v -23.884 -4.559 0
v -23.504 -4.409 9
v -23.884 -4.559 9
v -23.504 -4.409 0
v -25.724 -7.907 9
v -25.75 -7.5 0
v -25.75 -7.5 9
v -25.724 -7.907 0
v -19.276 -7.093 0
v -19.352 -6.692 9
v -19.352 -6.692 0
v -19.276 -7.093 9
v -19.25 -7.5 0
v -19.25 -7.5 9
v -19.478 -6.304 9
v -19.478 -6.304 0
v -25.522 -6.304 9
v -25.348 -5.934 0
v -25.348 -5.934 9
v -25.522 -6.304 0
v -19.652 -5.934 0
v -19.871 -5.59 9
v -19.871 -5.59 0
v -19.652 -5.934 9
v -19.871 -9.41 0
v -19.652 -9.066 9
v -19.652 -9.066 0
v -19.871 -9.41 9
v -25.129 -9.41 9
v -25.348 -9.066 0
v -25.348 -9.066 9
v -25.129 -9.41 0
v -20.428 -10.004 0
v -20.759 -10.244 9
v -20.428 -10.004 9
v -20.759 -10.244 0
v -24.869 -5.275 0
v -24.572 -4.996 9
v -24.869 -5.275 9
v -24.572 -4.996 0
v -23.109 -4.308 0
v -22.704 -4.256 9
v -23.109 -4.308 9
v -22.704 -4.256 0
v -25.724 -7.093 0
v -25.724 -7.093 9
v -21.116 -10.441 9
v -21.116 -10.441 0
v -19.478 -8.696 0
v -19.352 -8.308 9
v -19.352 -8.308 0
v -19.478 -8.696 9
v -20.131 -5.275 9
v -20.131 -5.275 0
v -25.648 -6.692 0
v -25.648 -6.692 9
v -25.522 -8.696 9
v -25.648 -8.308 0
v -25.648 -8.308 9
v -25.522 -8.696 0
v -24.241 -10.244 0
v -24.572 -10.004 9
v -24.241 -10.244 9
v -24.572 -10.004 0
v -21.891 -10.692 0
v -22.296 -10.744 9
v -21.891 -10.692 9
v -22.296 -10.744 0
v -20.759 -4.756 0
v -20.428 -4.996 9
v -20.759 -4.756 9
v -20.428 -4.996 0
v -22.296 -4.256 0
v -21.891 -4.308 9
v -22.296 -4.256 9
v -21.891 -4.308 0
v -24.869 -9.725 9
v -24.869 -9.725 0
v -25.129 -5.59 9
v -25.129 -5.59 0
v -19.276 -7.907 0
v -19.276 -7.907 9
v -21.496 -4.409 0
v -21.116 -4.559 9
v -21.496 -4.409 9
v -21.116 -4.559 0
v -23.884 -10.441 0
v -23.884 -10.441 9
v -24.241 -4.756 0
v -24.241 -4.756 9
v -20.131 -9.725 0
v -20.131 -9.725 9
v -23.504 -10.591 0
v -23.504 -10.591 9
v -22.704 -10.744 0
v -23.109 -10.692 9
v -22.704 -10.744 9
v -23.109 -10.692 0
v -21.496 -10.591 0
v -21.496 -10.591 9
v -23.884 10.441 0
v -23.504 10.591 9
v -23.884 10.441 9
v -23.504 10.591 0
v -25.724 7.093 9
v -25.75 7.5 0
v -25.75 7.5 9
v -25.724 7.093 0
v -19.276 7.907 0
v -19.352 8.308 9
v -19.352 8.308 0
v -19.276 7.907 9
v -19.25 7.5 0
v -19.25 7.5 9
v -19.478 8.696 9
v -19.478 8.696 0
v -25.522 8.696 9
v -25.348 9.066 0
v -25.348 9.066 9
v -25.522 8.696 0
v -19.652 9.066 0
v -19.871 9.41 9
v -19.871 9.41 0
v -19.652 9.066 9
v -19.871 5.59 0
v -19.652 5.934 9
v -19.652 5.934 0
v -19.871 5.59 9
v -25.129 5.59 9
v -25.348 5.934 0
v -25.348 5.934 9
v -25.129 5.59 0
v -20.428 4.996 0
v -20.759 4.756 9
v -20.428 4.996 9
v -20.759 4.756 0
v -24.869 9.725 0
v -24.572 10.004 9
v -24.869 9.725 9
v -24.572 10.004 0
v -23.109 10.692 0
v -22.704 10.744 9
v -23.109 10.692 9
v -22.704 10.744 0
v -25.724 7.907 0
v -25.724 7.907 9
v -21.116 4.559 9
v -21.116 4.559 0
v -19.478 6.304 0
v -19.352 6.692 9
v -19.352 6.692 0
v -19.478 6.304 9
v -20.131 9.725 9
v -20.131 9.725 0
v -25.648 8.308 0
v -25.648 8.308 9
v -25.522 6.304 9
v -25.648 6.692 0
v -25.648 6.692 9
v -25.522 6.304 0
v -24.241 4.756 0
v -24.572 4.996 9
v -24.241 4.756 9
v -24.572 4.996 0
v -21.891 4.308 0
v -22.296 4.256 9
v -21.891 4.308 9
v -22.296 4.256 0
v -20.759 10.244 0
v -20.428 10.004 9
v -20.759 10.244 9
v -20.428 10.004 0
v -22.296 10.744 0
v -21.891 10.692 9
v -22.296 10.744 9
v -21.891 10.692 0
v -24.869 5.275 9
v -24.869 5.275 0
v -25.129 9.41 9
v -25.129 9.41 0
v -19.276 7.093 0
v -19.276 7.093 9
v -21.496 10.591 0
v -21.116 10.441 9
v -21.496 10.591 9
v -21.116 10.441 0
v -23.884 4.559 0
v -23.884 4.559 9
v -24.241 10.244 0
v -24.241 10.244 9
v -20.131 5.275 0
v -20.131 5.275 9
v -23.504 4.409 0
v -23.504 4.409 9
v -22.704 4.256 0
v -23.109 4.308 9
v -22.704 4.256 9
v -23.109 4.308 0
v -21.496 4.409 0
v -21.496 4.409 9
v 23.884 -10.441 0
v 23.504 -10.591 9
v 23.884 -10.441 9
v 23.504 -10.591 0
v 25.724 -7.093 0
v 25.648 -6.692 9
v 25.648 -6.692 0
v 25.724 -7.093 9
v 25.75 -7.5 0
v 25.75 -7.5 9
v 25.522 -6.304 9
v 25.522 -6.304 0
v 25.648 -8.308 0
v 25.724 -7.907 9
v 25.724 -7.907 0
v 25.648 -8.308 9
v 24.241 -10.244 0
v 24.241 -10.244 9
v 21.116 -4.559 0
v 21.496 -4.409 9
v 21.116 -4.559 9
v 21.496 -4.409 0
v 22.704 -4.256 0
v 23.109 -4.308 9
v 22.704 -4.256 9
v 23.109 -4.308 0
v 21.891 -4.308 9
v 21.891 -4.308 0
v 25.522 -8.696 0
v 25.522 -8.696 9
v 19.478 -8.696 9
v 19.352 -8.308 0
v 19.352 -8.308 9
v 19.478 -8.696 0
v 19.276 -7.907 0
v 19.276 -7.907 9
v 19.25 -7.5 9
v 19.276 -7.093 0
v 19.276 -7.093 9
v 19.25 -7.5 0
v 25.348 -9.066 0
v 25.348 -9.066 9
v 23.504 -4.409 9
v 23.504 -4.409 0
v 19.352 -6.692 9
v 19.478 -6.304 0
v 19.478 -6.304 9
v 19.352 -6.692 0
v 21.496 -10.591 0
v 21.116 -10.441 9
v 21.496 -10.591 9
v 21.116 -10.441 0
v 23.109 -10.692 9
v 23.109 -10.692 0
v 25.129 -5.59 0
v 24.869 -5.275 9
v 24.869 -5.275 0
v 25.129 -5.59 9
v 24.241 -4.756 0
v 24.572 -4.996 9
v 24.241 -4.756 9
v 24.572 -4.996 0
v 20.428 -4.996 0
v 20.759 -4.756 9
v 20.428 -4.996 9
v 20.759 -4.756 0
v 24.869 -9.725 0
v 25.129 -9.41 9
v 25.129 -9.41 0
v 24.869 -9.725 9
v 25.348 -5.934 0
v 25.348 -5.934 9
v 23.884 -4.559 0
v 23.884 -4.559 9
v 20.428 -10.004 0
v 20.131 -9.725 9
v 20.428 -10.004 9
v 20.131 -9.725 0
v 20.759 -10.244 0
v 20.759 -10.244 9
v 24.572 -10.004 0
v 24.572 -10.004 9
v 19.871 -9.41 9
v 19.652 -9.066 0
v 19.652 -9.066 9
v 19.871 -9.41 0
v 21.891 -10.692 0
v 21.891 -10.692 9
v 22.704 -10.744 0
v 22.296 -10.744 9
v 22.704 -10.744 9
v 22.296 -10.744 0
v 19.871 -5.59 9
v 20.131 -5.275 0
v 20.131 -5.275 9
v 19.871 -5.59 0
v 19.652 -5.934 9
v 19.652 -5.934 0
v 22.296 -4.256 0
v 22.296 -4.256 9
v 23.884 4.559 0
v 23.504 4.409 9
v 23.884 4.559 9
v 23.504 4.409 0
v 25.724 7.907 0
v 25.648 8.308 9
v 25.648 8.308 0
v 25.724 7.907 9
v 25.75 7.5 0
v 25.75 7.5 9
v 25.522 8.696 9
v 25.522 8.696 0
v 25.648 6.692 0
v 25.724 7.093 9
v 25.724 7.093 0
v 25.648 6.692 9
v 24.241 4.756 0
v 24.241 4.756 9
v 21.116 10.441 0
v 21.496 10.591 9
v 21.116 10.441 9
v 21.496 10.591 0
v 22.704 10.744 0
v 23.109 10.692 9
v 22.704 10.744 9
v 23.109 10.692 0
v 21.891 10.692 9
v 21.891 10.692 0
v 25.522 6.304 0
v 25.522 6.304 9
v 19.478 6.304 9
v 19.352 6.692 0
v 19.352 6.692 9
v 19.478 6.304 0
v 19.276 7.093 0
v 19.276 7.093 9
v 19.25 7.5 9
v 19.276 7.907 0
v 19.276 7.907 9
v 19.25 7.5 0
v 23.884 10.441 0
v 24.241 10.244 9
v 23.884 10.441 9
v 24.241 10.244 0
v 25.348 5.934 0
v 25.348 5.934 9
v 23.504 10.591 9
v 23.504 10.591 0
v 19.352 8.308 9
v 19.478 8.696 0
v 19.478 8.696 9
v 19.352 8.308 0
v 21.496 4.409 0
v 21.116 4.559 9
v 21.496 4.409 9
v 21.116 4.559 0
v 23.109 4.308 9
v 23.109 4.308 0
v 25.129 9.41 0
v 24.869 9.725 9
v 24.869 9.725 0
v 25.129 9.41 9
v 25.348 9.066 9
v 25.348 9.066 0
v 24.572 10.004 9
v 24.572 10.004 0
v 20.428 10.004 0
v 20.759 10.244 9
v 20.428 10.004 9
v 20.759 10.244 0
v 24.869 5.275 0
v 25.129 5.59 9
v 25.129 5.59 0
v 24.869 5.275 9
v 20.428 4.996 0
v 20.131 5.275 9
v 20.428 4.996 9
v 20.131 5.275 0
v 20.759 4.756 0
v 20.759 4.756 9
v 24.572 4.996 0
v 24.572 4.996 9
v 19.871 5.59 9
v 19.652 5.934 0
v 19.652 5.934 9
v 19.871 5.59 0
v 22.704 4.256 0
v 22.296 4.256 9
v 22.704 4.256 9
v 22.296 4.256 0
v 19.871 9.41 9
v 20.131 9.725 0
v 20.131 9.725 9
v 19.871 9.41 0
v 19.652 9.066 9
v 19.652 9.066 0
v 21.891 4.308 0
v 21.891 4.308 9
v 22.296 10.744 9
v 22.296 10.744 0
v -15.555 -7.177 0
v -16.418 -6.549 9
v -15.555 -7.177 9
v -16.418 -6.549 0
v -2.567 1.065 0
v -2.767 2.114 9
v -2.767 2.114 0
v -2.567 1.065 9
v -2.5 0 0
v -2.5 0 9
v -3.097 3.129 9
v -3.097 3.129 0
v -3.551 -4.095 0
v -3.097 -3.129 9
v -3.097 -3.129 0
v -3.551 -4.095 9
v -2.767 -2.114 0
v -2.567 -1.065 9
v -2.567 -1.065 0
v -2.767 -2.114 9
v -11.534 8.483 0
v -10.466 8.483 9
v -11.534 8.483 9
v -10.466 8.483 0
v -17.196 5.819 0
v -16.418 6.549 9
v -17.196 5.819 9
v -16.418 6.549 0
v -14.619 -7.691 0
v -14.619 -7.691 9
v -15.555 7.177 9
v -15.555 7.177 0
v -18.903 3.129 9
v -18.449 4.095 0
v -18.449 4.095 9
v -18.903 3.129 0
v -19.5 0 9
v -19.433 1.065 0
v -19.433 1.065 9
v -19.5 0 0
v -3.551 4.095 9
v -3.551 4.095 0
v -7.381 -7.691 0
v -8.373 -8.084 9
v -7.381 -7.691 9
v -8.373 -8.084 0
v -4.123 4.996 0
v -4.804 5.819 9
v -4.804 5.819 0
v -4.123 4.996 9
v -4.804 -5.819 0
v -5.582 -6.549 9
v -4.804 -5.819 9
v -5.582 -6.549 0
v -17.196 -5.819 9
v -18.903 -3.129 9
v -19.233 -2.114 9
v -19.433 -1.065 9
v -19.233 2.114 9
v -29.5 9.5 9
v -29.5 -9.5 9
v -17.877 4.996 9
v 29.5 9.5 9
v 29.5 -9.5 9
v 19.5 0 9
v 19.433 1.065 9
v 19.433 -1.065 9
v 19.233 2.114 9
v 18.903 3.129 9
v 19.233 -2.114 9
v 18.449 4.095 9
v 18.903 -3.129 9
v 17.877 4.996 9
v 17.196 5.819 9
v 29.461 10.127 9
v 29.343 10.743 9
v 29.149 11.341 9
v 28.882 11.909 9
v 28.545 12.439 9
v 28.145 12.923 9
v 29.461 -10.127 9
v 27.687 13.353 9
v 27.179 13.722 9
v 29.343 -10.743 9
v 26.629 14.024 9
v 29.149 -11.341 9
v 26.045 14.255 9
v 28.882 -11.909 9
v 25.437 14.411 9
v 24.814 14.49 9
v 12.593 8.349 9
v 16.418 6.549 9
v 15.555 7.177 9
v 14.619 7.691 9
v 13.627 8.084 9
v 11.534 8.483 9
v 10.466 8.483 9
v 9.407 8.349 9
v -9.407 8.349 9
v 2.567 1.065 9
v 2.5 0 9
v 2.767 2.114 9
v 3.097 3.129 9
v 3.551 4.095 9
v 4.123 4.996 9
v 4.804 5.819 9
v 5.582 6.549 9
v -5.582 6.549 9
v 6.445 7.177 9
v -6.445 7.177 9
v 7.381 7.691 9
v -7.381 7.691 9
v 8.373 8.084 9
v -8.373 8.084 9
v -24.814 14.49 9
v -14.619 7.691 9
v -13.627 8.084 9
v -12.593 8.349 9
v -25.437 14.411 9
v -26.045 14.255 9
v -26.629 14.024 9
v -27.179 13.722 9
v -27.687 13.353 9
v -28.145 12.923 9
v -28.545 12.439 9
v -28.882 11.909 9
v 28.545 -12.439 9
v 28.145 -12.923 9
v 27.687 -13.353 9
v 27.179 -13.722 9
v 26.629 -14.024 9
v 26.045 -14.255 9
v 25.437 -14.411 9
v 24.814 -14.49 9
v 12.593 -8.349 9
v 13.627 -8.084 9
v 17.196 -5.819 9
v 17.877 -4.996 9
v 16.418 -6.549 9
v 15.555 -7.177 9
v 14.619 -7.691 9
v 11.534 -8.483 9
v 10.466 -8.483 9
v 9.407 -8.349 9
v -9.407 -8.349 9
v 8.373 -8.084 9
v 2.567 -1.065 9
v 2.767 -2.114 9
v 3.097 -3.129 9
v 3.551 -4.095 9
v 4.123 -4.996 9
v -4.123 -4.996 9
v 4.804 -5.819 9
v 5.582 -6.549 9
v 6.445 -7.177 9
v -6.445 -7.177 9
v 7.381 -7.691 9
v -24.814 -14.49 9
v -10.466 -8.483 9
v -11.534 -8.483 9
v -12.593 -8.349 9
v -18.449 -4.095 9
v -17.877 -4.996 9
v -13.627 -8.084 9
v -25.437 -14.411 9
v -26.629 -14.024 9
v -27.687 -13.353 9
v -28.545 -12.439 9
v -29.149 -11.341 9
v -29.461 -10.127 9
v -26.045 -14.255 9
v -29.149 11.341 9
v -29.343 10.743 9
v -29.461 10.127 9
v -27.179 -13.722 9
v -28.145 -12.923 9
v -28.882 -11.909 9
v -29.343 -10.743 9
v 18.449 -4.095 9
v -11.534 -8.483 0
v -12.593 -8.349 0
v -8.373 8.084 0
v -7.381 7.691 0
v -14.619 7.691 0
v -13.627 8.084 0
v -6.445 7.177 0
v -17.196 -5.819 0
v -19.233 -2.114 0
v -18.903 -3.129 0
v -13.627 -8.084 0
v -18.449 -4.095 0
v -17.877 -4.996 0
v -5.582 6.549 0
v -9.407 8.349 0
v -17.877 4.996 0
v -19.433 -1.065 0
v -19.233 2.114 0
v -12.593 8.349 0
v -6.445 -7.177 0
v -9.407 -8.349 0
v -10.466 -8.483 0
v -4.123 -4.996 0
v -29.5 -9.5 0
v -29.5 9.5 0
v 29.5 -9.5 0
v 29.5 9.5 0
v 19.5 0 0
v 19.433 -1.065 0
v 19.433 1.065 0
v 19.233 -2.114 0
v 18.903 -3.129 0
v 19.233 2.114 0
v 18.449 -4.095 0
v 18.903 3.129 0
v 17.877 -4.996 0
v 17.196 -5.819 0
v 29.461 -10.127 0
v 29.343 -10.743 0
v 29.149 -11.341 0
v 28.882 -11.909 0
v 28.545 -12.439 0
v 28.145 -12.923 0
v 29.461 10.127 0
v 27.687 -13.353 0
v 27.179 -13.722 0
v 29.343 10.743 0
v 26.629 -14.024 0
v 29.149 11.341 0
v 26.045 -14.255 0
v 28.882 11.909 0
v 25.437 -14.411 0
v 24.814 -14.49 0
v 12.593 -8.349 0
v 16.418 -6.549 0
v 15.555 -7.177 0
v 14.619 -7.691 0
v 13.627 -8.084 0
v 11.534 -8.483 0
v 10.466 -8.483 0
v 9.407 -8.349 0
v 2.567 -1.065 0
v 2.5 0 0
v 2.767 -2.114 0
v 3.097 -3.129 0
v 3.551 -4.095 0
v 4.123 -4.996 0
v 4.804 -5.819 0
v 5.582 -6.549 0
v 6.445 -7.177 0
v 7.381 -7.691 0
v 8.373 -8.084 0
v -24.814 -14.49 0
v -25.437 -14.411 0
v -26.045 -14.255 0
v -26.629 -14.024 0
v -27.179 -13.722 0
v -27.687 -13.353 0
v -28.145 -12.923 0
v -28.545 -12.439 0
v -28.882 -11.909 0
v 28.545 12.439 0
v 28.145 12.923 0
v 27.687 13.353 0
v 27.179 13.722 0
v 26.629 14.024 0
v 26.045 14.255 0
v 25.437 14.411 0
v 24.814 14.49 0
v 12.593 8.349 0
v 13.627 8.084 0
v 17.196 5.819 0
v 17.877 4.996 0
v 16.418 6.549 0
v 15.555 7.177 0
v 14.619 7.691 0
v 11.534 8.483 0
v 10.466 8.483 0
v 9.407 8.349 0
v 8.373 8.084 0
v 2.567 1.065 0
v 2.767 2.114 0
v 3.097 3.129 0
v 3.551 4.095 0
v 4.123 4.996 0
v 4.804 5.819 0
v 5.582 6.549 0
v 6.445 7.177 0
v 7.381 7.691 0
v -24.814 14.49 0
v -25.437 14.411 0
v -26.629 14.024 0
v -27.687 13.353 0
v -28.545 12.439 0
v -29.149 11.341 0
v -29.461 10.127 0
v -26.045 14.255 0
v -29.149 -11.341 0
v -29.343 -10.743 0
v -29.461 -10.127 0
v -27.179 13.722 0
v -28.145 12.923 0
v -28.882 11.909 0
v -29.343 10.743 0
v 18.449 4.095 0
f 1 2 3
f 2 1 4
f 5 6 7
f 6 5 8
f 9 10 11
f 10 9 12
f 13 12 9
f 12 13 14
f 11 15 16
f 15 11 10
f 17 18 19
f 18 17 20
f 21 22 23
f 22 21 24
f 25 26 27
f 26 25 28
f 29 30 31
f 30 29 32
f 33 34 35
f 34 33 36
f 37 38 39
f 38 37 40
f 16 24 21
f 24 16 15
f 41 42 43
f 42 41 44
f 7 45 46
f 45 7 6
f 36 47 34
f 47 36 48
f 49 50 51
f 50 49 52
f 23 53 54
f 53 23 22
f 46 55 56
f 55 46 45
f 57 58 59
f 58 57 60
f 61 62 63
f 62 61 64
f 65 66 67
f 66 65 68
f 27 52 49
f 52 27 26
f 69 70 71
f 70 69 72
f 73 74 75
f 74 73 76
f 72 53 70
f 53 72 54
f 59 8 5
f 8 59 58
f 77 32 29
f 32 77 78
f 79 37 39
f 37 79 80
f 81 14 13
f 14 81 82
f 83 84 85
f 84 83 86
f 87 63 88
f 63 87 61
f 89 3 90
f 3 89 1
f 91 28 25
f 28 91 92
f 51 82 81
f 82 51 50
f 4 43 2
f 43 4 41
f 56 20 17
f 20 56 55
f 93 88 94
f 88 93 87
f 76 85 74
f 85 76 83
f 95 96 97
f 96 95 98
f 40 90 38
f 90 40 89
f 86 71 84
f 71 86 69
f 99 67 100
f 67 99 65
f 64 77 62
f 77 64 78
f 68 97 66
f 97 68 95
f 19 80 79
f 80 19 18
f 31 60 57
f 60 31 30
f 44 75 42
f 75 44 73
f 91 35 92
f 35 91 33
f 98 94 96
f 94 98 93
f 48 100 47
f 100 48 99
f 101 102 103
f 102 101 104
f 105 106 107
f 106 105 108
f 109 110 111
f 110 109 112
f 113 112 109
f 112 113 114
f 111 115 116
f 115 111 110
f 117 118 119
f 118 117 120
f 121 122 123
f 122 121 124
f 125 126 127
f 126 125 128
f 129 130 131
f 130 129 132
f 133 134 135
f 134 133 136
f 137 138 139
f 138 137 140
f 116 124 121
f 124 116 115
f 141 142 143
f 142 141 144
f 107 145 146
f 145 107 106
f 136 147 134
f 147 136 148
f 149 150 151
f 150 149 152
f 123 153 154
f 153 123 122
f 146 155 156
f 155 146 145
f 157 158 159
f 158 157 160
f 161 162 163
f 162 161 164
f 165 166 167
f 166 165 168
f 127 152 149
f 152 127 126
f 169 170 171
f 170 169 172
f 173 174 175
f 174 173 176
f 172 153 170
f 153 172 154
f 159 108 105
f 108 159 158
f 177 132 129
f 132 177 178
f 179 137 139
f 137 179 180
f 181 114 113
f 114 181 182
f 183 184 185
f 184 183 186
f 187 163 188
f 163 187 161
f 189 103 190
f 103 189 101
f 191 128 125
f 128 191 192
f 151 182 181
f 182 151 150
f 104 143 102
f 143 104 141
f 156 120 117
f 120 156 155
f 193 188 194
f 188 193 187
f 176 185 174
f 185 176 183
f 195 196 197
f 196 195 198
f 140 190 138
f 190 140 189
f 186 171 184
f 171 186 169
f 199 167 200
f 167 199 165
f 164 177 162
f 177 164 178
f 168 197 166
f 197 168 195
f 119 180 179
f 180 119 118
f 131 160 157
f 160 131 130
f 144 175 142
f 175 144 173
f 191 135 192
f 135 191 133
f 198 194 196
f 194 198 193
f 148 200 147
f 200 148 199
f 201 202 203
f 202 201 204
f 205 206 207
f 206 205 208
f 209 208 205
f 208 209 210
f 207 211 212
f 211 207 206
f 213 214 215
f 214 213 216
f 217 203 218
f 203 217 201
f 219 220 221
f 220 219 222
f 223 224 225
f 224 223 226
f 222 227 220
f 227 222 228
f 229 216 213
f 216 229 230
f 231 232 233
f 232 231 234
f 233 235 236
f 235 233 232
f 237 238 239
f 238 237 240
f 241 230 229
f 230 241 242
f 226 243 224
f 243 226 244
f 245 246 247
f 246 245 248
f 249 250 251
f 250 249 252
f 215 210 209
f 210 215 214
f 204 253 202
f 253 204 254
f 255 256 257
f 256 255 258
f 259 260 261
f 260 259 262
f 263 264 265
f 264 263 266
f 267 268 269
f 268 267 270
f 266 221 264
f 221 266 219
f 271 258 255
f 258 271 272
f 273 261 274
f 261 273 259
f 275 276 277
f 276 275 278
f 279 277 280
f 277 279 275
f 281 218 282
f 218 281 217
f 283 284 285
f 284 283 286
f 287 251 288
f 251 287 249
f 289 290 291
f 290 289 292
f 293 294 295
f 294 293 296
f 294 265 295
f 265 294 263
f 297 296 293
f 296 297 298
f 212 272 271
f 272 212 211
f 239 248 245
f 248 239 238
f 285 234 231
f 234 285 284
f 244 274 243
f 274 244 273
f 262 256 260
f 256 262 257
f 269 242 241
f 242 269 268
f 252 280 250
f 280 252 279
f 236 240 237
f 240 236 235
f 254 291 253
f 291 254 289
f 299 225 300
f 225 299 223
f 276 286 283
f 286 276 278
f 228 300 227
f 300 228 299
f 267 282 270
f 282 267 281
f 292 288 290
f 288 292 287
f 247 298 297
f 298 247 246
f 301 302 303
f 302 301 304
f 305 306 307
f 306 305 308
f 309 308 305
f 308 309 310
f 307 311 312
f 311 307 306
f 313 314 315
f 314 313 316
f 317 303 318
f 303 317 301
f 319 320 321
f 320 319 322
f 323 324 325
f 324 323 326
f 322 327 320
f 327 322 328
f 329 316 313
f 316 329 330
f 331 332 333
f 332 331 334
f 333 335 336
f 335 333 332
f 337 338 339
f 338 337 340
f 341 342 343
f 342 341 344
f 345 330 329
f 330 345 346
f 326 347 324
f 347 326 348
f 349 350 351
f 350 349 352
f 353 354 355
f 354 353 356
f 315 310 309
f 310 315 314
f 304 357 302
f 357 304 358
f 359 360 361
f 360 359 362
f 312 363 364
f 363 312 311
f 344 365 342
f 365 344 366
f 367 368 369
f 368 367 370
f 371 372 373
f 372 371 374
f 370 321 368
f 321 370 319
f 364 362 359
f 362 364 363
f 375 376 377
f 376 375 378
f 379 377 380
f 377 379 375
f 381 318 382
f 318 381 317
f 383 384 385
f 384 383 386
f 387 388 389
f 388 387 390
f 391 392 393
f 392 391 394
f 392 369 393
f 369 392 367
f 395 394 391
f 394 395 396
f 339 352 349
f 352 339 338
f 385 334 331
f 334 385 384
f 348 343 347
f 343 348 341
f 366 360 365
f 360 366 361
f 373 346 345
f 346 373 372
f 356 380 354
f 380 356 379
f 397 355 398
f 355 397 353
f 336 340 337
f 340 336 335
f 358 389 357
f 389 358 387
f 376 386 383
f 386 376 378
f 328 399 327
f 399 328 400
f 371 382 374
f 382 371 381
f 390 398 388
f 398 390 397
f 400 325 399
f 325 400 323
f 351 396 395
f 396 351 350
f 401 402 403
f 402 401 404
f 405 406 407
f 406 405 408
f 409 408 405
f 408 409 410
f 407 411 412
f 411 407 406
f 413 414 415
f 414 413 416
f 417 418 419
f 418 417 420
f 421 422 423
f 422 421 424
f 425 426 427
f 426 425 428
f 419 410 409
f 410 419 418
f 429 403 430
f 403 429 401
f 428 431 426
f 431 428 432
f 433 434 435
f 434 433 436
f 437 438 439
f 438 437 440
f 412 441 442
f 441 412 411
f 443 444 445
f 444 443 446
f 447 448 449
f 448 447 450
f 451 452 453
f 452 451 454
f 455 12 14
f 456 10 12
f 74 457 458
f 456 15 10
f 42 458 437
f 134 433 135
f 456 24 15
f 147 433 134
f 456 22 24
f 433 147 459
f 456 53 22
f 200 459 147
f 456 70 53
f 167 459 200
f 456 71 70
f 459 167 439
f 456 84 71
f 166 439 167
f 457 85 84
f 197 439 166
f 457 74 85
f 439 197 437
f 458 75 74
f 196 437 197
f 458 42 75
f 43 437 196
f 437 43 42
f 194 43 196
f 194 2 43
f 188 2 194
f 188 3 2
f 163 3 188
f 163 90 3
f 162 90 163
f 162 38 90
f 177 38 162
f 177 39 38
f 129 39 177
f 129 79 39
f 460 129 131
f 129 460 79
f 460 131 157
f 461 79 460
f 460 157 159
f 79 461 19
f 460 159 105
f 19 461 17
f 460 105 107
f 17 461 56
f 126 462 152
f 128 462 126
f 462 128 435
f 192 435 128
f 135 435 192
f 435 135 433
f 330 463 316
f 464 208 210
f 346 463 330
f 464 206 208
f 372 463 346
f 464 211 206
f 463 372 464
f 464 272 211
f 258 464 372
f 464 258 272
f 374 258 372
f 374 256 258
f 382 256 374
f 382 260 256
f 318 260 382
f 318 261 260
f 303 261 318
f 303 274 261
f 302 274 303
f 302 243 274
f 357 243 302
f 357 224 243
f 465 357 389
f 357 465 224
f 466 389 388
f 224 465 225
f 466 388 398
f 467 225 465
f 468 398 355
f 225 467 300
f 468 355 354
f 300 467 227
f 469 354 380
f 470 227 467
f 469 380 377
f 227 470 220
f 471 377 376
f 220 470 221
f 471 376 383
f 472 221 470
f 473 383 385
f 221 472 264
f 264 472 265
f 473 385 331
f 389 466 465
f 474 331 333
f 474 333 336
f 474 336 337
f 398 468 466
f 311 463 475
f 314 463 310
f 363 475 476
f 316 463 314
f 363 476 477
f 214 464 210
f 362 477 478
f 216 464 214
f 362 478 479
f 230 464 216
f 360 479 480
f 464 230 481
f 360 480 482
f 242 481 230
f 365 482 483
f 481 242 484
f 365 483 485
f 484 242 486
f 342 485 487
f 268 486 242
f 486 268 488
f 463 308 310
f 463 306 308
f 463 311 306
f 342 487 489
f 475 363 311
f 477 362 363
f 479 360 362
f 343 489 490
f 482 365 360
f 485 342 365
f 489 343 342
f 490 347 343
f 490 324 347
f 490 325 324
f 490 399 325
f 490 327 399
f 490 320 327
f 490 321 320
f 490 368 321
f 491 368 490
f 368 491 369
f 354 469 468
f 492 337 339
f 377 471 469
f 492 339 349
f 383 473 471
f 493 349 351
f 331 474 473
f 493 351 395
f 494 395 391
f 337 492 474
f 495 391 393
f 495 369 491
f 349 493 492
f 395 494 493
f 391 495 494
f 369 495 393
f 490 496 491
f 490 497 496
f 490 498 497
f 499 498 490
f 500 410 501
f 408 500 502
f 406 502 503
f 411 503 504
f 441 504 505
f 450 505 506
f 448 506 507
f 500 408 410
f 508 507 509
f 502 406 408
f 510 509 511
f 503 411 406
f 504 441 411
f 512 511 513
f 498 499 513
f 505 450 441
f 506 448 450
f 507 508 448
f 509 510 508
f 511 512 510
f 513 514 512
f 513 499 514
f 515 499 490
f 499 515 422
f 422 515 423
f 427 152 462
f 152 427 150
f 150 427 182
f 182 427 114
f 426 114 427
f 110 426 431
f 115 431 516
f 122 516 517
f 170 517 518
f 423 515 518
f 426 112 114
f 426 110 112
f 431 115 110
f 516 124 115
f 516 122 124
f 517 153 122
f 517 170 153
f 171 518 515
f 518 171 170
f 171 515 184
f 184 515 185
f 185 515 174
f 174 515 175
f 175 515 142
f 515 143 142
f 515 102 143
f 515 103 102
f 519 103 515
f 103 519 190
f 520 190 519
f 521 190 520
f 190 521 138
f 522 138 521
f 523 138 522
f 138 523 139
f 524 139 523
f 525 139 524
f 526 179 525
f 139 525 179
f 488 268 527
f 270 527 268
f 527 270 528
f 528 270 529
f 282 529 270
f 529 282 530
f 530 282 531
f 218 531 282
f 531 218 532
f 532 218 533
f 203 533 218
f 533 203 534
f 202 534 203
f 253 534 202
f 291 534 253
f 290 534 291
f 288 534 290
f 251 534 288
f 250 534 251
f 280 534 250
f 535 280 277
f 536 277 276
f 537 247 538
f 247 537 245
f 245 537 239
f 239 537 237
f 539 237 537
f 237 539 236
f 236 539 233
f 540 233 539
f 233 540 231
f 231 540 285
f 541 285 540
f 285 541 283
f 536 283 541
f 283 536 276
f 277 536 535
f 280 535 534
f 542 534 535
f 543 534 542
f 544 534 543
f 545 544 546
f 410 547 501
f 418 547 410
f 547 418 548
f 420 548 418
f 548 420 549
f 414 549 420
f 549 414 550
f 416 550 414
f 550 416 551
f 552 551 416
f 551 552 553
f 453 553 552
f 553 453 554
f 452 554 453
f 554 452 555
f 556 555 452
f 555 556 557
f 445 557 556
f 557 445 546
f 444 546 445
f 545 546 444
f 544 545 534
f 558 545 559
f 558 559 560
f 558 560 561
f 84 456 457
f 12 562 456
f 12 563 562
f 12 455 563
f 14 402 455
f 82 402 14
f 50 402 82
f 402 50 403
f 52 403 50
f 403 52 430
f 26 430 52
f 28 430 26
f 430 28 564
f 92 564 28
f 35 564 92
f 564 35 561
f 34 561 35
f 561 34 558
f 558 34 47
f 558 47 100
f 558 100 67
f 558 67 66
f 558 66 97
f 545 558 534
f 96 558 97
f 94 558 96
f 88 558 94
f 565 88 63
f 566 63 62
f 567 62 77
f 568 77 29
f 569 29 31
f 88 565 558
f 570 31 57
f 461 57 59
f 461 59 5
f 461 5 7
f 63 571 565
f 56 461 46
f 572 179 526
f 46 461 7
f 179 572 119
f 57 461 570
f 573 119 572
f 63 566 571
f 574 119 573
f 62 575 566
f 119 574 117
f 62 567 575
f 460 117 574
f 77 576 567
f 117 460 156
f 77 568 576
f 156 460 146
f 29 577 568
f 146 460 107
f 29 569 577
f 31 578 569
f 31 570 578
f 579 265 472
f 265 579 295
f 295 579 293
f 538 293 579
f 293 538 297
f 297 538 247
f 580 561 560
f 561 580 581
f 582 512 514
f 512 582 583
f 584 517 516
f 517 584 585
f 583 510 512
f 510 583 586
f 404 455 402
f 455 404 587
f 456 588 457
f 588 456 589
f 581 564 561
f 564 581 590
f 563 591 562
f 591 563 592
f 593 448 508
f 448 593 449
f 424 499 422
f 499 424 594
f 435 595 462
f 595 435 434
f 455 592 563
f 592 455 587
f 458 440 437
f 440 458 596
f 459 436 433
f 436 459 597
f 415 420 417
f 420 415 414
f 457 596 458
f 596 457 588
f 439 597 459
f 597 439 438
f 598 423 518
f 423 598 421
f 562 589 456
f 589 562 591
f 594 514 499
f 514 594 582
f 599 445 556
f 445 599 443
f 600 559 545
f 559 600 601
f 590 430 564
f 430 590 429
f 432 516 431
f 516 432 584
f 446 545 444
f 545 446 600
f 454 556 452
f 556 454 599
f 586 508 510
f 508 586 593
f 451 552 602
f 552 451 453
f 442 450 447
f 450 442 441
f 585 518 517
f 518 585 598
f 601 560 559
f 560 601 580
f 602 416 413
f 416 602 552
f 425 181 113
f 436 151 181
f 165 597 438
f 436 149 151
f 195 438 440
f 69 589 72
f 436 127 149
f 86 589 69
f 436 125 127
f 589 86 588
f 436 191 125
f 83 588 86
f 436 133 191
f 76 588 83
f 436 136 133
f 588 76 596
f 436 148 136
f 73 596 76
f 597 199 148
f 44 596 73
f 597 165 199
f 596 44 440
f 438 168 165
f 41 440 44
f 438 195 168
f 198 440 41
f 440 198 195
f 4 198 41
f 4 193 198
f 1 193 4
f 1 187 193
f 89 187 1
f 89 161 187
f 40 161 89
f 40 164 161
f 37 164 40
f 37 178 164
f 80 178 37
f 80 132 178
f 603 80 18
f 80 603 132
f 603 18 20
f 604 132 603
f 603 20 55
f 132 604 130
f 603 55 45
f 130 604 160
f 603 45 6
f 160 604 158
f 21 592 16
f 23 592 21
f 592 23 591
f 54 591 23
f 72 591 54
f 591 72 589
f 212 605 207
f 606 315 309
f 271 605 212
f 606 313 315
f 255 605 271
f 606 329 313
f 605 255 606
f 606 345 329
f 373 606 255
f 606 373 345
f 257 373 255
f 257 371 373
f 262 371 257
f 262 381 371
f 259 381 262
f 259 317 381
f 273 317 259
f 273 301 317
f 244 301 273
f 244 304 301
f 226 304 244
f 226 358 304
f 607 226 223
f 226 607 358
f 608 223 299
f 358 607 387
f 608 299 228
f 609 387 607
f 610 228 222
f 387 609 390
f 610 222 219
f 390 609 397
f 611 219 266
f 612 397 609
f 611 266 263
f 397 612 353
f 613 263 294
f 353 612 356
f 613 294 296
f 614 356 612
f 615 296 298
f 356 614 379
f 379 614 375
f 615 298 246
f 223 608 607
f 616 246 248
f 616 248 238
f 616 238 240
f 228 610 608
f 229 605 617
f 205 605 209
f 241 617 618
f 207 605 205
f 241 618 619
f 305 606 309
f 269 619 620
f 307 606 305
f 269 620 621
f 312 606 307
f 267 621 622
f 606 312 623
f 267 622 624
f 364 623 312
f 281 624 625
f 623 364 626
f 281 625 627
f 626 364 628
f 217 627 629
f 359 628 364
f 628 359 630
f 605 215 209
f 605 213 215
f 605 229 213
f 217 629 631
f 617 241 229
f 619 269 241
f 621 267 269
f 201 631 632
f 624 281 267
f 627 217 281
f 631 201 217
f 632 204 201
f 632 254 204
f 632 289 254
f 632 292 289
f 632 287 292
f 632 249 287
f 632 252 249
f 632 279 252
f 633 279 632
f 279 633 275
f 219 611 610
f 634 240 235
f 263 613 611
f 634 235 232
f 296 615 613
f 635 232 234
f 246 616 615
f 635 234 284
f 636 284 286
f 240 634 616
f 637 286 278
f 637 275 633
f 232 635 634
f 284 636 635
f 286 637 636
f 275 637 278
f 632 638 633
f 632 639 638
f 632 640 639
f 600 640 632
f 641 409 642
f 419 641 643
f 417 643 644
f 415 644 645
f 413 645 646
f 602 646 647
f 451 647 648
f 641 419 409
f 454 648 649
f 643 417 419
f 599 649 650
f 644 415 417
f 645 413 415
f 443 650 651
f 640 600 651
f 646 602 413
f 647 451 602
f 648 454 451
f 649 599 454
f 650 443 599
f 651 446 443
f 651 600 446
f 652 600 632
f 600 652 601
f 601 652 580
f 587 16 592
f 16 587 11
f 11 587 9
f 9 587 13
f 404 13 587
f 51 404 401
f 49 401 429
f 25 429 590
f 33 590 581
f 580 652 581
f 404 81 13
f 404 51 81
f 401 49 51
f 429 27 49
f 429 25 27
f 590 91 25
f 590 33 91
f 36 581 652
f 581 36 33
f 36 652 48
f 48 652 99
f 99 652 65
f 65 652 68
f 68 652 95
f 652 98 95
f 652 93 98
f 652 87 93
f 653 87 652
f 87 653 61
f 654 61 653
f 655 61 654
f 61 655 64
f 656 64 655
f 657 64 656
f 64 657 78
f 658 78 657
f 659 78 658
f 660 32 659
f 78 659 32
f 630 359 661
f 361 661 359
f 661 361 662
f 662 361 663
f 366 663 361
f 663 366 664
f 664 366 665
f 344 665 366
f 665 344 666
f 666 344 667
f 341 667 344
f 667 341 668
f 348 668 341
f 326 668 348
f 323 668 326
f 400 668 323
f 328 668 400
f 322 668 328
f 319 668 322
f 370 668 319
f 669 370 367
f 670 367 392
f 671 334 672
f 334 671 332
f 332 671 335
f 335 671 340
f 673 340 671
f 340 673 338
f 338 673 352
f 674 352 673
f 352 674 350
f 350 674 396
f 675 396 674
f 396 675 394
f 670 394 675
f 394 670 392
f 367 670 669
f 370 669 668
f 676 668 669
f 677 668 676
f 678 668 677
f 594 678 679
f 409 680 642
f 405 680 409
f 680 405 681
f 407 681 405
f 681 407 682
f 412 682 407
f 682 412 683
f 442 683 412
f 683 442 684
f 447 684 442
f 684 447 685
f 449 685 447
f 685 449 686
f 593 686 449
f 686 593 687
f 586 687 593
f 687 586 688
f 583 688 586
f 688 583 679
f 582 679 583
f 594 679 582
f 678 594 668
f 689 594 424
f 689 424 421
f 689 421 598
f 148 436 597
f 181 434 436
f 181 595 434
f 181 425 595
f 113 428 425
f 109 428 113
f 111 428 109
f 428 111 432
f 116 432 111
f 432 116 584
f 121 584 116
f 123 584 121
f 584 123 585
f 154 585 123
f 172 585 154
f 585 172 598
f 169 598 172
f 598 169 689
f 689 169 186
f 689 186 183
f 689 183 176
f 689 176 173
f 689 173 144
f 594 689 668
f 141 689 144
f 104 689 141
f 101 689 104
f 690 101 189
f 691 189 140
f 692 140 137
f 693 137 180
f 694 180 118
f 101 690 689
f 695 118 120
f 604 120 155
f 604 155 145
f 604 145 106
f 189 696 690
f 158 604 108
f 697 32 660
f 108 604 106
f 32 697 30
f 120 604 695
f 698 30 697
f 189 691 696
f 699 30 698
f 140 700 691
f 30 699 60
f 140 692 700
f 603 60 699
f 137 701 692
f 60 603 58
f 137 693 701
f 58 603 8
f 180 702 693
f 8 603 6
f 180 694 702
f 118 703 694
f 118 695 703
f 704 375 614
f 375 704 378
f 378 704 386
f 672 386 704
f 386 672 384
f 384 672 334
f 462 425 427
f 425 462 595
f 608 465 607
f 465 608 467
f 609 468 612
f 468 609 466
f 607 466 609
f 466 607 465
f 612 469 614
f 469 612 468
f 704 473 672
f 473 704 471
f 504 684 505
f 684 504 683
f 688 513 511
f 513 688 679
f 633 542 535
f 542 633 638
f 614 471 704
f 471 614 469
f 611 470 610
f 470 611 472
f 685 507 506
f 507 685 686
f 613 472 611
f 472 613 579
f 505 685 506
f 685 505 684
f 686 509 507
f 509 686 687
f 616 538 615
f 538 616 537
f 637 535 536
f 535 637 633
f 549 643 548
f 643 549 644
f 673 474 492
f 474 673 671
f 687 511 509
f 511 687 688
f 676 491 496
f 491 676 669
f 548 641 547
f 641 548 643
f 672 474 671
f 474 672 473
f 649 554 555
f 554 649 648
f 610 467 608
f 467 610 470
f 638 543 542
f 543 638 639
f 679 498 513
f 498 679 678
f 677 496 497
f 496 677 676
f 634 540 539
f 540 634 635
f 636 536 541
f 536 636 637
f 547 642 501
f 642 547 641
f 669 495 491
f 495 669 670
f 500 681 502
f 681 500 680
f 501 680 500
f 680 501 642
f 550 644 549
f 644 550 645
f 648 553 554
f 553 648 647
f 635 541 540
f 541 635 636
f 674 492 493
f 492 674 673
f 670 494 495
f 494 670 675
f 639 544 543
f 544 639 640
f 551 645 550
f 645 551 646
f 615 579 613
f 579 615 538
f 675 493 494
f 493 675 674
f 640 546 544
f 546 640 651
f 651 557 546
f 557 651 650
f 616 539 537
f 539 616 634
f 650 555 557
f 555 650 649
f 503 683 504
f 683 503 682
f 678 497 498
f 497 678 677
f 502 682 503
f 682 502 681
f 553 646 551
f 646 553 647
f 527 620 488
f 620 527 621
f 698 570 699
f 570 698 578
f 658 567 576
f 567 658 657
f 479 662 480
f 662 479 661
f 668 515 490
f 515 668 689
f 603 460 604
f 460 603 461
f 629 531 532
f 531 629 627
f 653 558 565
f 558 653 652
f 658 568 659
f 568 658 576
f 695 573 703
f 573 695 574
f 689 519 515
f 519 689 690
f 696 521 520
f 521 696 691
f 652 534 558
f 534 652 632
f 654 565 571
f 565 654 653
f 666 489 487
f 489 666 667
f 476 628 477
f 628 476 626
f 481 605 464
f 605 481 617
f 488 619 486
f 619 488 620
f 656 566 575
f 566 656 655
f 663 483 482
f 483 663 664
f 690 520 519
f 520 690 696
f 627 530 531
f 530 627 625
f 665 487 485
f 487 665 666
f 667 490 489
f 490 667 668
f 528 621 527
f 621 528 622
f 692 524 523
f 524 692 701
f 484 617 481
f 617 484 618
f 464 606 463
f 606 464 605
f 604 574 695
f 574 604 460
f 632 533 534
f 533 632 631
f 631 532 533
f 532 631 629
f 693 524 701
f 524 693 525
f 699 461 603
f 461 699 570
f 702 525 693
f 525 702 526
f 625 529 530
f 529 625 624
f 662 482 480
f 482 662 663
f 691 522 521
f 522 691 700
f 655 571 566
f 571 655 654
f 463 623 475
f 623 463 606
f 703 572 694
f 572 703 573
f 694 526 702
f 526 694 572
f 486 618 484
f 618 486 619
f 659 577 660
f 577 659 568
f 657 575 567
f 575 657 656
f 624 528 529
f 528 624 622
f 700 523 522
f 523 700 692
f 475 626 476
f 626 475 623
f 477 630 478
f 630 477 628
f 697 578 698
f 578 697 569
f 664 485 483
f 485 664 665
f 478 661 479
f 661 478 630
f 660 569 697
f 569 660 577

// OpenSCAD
$fn = 50;

difference() {
	union() {
		hull() {
			translate(v = [-24.5, 9.5, 0]) {
				cylinder(h = 9, r = 5);
			}
			translate(v = [24.5, 9.5, 0]) {
				cylinder(h = 9, r = 5);
			}
			translate(v = [-24.5, -9.5, 0]) {
				cylinder(h = 9, r = 5);
			}
			translate(v = [24.5, -9.5, 0]) {
				cylinder(h = 9, r = 5);
			}
		}
	}
	union() {
		translate(v = [-22.5, -7.5, -100.0]) {
			cylinder(h = 200, r = 3.25);
		}
		translate(v = [-22.5, 7.5, -100.0]) {
			cylinder(h = 200, r = 3.25);
		}
		translate(v = [22.5, -7.5, -100.0]) {
			cylinder(h = 200, r = 3.25);
		}
		translate(v = [22.5, 7.5, -100.0]) {
			cylinder(h = 200, r = 3.25);
		}
		translate(v = [-22.5, -7.5, -100.0]) {
			cylinder(h = 200, r = 1.8);
		}
		translate(v = [-22.5, 7.5, -100.0]) {
			cylinder(h = 200, r = 1.8);
		}
		translate(v = [22.5, -7.5, -100.0]) {
			cylinder(h = 200, r = 1.8);
		}
		translate(v = [22.5, 7.5, -100.0]) {
			cylinder(h = 200, r = 1.8);
		}
		translate(v = [-11.0, 0, 0.0]) {
			cylinder(h = 9, r = 8.5);
		}
		translate(v = [11.0, 0, 0.0]) {
			cylinder(h = 9, r = 8.5);
		}
	}
}
